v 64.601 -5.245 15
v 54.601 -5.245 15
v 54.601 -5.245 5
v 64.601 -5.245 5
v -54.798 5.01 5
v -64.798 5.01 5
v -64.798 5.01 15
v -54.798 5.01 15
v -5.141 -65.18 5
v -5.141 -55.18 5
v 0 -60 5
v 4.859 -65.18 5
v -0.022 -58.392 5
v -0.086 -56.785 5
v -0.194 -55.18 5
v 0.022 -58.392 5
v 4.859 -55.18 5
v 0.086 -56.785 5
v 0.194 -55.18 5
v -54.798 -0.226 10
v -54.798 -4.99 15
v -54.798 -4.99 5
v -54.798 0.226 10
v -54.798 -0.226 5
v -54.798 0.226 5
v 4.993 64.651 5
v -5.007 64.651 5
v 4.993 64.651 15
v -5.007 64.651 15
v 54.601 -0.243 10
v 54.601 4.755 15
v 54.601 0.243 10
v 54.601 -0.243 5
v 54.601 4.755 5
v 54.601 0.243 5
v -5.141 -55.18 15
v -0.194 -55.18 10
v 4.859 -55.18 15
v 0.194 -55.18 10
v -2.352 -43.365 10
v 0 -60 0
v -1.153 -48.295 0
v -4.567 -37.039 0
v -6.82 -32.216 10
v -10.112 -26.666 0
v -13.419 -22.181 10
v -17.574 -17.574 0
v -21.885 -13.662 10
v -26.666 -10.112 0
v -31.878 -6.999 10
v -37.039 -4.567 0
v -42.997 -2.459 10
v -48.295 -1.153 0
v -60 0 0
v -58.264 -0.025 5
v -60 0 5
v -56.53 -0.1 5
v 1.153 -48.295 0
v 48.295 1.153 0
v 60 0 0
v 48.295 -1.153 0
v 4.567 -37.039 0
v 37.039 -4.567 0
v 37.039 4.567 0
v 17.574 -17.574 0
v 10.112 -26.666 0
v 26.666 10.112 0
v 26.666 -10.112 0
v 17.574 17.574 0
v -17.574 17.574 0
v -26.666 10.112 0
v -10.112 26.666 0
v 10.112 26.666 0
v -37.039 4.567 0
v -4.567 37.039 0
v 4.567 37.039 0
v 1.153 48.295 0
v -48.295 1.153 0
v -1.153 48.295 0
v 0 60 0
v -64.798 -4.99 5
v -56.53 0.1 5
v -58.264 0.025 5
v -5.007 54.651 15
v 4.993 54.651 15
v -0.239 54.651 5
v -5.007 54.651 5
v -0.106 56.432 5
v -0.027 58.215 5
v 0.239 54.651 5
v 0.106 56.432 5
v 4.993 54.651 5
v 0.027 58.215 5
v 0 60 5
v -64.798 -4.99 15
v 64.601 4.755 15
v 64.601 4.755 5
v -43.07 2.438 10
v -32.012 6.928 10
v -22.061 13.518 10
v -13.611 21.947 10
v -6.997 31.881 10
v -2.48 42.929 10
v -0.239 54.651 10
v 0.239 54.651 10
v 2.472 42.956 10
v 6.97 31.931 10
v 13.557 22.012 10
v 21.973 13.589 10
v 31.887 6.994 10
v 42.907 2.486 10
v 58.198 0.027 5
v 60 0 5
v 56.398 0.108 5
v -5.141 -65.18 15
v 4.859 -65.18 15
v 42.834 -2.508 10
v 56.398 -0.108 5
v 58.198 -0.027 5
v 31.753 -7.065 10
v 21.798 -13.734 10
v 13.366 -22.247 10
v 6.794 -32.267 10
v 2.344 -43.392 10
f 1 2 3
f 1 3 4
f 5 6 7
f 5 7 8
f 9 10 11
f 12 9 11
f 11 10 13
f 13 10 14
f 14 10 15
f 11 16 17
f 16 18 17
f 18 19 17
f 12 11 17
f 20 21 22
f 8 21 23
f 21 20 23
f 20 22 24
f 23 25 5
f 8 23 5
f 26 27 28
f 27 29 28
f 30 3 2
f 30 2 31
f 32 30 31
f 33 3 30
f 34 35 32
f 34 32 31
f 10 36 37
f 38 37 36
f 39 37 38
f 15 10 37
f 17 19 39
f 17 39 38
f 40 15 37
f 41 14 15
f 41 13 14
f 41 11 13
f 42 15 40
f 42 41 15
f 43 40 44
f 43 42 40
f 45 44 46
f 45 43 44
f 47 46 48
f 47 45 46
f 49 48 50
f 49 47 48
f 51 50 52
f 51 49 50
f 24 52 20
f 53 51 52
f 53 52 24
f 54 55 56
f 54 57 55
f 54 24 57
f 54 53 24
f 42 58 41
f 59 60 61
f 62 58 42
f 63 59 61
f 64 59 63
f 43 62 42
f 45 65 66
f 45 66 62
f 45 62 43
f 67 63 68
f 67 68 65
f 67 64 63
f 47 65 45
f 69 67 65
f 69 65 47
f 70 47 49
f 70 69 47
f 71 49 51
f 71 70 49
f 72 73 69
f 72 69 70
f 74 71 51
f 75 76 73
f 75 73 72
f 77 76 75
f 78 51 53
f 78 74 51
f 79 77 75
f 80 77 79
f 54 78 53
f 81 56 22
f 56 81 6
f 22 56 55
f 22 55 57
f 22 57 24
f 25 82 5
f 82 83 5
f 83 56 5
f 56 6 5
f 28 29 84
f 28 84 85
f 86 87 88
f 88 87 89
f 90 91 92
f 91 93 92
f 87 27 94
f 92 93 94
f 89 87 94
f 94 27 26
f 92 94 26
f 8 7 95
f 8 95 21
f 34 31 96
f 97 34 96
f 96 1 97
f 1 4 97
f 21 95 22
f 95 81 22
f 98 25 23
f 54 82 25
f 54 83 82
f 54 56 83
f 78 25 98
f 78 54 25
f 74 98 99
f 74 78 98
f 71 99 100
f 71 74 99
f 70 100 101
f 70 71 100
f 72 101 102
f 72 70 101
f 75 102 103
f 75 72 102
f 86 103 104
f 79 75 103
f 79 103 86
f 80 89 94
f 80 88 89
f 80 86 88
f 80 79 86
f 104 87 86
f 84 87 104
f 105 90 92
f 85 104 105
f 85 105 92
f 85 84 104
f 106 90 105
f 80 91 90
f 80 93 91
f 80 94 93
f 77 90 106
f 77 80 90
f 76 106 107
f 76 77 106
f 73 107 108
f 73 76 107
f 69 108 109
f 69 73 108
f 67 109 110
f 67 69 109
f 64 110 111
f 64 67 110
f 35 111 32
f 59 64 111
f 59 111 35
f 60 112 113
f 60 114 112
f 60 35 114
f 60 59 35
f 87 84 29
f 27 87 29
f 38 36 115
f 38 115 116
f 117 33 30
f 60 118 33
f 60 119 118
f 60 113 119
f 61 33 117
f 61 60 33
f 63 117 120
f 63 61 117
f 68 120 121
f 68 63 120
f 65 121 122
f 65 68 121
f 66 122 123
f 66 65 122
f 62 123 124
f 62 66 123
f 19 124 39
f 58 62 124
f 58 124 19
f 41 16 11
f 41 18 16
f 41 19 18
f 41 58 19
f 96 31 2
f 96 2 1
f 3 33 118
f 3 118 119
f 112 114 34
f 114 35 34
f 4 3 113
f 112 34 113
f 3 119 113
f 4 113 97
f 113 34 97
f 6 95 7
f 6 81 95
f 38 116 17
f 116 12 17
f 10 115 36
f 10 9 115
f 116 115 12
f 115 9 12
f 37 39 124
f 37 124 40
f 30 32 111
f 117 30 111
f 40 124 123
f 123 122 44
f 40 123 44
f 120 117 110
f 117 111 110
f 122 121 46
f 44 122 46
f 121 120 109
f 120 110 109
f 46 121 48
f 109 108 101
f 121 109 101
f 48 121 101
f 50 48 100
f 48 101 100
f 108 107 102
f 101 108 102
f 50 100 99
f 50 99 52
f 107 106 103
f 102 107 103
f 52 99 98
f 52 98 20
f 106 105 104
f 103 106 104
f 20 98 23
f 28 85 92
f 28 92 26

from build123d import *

# Parameters (mm, degrees)
BOSS_EXTRUDE2_DEPTH = 10
SKETCH2_W           = 10
SKETCH2_H           = 10
BOSS_EXTRUDE3_DEPTH = 5


with BuildPart() as part:
    # Sketch1 → Boss-Extrude2 (new body)
    with BuildSketch(Plane.XY):
        with BuildLine():
            ThreePointArc((0, 60), (17.573593129, 17.573593129), (60, 0))
            ThreePointArc((60, 0), (17.573593129, -17.573593129), (0, -60))
            ThreePointArc((0, -60), (-17.573593129, -17.573593129), (-60, 0))
            ThreePointArc((-60, 0), (-17.573593129, 17.573593129), (0, 60))
        make_face()
    extrude(amount=BOSS_EXTRUDE2_DEPTH)

    # Sketch2 → Boss-Extrude3 (add, symmetric)
    with BuildSketch(Plane.XY.offset(10)):
        with Locations((-0.141365773, -60.179831665)):
            Rectangle(SKETCH2_W, SKETCH2_H)
        with Locations((59.60084876, -0.244611601)):
            Rectangle(SKETCH2_W, SKETCH2_H)
        with Locations((-59.798330542, 0.00957883)):
            Rectangle(SKETCH2_W, SKETCH2_H)
        with Locations((-0.007106667, 59.651317451)):
            Rectangle(SKETCH2_W, SKETCH2_H)
    extrude(amount=BOSS_EXTRUDE3_DEPTH, both=True)


solid = part.part
